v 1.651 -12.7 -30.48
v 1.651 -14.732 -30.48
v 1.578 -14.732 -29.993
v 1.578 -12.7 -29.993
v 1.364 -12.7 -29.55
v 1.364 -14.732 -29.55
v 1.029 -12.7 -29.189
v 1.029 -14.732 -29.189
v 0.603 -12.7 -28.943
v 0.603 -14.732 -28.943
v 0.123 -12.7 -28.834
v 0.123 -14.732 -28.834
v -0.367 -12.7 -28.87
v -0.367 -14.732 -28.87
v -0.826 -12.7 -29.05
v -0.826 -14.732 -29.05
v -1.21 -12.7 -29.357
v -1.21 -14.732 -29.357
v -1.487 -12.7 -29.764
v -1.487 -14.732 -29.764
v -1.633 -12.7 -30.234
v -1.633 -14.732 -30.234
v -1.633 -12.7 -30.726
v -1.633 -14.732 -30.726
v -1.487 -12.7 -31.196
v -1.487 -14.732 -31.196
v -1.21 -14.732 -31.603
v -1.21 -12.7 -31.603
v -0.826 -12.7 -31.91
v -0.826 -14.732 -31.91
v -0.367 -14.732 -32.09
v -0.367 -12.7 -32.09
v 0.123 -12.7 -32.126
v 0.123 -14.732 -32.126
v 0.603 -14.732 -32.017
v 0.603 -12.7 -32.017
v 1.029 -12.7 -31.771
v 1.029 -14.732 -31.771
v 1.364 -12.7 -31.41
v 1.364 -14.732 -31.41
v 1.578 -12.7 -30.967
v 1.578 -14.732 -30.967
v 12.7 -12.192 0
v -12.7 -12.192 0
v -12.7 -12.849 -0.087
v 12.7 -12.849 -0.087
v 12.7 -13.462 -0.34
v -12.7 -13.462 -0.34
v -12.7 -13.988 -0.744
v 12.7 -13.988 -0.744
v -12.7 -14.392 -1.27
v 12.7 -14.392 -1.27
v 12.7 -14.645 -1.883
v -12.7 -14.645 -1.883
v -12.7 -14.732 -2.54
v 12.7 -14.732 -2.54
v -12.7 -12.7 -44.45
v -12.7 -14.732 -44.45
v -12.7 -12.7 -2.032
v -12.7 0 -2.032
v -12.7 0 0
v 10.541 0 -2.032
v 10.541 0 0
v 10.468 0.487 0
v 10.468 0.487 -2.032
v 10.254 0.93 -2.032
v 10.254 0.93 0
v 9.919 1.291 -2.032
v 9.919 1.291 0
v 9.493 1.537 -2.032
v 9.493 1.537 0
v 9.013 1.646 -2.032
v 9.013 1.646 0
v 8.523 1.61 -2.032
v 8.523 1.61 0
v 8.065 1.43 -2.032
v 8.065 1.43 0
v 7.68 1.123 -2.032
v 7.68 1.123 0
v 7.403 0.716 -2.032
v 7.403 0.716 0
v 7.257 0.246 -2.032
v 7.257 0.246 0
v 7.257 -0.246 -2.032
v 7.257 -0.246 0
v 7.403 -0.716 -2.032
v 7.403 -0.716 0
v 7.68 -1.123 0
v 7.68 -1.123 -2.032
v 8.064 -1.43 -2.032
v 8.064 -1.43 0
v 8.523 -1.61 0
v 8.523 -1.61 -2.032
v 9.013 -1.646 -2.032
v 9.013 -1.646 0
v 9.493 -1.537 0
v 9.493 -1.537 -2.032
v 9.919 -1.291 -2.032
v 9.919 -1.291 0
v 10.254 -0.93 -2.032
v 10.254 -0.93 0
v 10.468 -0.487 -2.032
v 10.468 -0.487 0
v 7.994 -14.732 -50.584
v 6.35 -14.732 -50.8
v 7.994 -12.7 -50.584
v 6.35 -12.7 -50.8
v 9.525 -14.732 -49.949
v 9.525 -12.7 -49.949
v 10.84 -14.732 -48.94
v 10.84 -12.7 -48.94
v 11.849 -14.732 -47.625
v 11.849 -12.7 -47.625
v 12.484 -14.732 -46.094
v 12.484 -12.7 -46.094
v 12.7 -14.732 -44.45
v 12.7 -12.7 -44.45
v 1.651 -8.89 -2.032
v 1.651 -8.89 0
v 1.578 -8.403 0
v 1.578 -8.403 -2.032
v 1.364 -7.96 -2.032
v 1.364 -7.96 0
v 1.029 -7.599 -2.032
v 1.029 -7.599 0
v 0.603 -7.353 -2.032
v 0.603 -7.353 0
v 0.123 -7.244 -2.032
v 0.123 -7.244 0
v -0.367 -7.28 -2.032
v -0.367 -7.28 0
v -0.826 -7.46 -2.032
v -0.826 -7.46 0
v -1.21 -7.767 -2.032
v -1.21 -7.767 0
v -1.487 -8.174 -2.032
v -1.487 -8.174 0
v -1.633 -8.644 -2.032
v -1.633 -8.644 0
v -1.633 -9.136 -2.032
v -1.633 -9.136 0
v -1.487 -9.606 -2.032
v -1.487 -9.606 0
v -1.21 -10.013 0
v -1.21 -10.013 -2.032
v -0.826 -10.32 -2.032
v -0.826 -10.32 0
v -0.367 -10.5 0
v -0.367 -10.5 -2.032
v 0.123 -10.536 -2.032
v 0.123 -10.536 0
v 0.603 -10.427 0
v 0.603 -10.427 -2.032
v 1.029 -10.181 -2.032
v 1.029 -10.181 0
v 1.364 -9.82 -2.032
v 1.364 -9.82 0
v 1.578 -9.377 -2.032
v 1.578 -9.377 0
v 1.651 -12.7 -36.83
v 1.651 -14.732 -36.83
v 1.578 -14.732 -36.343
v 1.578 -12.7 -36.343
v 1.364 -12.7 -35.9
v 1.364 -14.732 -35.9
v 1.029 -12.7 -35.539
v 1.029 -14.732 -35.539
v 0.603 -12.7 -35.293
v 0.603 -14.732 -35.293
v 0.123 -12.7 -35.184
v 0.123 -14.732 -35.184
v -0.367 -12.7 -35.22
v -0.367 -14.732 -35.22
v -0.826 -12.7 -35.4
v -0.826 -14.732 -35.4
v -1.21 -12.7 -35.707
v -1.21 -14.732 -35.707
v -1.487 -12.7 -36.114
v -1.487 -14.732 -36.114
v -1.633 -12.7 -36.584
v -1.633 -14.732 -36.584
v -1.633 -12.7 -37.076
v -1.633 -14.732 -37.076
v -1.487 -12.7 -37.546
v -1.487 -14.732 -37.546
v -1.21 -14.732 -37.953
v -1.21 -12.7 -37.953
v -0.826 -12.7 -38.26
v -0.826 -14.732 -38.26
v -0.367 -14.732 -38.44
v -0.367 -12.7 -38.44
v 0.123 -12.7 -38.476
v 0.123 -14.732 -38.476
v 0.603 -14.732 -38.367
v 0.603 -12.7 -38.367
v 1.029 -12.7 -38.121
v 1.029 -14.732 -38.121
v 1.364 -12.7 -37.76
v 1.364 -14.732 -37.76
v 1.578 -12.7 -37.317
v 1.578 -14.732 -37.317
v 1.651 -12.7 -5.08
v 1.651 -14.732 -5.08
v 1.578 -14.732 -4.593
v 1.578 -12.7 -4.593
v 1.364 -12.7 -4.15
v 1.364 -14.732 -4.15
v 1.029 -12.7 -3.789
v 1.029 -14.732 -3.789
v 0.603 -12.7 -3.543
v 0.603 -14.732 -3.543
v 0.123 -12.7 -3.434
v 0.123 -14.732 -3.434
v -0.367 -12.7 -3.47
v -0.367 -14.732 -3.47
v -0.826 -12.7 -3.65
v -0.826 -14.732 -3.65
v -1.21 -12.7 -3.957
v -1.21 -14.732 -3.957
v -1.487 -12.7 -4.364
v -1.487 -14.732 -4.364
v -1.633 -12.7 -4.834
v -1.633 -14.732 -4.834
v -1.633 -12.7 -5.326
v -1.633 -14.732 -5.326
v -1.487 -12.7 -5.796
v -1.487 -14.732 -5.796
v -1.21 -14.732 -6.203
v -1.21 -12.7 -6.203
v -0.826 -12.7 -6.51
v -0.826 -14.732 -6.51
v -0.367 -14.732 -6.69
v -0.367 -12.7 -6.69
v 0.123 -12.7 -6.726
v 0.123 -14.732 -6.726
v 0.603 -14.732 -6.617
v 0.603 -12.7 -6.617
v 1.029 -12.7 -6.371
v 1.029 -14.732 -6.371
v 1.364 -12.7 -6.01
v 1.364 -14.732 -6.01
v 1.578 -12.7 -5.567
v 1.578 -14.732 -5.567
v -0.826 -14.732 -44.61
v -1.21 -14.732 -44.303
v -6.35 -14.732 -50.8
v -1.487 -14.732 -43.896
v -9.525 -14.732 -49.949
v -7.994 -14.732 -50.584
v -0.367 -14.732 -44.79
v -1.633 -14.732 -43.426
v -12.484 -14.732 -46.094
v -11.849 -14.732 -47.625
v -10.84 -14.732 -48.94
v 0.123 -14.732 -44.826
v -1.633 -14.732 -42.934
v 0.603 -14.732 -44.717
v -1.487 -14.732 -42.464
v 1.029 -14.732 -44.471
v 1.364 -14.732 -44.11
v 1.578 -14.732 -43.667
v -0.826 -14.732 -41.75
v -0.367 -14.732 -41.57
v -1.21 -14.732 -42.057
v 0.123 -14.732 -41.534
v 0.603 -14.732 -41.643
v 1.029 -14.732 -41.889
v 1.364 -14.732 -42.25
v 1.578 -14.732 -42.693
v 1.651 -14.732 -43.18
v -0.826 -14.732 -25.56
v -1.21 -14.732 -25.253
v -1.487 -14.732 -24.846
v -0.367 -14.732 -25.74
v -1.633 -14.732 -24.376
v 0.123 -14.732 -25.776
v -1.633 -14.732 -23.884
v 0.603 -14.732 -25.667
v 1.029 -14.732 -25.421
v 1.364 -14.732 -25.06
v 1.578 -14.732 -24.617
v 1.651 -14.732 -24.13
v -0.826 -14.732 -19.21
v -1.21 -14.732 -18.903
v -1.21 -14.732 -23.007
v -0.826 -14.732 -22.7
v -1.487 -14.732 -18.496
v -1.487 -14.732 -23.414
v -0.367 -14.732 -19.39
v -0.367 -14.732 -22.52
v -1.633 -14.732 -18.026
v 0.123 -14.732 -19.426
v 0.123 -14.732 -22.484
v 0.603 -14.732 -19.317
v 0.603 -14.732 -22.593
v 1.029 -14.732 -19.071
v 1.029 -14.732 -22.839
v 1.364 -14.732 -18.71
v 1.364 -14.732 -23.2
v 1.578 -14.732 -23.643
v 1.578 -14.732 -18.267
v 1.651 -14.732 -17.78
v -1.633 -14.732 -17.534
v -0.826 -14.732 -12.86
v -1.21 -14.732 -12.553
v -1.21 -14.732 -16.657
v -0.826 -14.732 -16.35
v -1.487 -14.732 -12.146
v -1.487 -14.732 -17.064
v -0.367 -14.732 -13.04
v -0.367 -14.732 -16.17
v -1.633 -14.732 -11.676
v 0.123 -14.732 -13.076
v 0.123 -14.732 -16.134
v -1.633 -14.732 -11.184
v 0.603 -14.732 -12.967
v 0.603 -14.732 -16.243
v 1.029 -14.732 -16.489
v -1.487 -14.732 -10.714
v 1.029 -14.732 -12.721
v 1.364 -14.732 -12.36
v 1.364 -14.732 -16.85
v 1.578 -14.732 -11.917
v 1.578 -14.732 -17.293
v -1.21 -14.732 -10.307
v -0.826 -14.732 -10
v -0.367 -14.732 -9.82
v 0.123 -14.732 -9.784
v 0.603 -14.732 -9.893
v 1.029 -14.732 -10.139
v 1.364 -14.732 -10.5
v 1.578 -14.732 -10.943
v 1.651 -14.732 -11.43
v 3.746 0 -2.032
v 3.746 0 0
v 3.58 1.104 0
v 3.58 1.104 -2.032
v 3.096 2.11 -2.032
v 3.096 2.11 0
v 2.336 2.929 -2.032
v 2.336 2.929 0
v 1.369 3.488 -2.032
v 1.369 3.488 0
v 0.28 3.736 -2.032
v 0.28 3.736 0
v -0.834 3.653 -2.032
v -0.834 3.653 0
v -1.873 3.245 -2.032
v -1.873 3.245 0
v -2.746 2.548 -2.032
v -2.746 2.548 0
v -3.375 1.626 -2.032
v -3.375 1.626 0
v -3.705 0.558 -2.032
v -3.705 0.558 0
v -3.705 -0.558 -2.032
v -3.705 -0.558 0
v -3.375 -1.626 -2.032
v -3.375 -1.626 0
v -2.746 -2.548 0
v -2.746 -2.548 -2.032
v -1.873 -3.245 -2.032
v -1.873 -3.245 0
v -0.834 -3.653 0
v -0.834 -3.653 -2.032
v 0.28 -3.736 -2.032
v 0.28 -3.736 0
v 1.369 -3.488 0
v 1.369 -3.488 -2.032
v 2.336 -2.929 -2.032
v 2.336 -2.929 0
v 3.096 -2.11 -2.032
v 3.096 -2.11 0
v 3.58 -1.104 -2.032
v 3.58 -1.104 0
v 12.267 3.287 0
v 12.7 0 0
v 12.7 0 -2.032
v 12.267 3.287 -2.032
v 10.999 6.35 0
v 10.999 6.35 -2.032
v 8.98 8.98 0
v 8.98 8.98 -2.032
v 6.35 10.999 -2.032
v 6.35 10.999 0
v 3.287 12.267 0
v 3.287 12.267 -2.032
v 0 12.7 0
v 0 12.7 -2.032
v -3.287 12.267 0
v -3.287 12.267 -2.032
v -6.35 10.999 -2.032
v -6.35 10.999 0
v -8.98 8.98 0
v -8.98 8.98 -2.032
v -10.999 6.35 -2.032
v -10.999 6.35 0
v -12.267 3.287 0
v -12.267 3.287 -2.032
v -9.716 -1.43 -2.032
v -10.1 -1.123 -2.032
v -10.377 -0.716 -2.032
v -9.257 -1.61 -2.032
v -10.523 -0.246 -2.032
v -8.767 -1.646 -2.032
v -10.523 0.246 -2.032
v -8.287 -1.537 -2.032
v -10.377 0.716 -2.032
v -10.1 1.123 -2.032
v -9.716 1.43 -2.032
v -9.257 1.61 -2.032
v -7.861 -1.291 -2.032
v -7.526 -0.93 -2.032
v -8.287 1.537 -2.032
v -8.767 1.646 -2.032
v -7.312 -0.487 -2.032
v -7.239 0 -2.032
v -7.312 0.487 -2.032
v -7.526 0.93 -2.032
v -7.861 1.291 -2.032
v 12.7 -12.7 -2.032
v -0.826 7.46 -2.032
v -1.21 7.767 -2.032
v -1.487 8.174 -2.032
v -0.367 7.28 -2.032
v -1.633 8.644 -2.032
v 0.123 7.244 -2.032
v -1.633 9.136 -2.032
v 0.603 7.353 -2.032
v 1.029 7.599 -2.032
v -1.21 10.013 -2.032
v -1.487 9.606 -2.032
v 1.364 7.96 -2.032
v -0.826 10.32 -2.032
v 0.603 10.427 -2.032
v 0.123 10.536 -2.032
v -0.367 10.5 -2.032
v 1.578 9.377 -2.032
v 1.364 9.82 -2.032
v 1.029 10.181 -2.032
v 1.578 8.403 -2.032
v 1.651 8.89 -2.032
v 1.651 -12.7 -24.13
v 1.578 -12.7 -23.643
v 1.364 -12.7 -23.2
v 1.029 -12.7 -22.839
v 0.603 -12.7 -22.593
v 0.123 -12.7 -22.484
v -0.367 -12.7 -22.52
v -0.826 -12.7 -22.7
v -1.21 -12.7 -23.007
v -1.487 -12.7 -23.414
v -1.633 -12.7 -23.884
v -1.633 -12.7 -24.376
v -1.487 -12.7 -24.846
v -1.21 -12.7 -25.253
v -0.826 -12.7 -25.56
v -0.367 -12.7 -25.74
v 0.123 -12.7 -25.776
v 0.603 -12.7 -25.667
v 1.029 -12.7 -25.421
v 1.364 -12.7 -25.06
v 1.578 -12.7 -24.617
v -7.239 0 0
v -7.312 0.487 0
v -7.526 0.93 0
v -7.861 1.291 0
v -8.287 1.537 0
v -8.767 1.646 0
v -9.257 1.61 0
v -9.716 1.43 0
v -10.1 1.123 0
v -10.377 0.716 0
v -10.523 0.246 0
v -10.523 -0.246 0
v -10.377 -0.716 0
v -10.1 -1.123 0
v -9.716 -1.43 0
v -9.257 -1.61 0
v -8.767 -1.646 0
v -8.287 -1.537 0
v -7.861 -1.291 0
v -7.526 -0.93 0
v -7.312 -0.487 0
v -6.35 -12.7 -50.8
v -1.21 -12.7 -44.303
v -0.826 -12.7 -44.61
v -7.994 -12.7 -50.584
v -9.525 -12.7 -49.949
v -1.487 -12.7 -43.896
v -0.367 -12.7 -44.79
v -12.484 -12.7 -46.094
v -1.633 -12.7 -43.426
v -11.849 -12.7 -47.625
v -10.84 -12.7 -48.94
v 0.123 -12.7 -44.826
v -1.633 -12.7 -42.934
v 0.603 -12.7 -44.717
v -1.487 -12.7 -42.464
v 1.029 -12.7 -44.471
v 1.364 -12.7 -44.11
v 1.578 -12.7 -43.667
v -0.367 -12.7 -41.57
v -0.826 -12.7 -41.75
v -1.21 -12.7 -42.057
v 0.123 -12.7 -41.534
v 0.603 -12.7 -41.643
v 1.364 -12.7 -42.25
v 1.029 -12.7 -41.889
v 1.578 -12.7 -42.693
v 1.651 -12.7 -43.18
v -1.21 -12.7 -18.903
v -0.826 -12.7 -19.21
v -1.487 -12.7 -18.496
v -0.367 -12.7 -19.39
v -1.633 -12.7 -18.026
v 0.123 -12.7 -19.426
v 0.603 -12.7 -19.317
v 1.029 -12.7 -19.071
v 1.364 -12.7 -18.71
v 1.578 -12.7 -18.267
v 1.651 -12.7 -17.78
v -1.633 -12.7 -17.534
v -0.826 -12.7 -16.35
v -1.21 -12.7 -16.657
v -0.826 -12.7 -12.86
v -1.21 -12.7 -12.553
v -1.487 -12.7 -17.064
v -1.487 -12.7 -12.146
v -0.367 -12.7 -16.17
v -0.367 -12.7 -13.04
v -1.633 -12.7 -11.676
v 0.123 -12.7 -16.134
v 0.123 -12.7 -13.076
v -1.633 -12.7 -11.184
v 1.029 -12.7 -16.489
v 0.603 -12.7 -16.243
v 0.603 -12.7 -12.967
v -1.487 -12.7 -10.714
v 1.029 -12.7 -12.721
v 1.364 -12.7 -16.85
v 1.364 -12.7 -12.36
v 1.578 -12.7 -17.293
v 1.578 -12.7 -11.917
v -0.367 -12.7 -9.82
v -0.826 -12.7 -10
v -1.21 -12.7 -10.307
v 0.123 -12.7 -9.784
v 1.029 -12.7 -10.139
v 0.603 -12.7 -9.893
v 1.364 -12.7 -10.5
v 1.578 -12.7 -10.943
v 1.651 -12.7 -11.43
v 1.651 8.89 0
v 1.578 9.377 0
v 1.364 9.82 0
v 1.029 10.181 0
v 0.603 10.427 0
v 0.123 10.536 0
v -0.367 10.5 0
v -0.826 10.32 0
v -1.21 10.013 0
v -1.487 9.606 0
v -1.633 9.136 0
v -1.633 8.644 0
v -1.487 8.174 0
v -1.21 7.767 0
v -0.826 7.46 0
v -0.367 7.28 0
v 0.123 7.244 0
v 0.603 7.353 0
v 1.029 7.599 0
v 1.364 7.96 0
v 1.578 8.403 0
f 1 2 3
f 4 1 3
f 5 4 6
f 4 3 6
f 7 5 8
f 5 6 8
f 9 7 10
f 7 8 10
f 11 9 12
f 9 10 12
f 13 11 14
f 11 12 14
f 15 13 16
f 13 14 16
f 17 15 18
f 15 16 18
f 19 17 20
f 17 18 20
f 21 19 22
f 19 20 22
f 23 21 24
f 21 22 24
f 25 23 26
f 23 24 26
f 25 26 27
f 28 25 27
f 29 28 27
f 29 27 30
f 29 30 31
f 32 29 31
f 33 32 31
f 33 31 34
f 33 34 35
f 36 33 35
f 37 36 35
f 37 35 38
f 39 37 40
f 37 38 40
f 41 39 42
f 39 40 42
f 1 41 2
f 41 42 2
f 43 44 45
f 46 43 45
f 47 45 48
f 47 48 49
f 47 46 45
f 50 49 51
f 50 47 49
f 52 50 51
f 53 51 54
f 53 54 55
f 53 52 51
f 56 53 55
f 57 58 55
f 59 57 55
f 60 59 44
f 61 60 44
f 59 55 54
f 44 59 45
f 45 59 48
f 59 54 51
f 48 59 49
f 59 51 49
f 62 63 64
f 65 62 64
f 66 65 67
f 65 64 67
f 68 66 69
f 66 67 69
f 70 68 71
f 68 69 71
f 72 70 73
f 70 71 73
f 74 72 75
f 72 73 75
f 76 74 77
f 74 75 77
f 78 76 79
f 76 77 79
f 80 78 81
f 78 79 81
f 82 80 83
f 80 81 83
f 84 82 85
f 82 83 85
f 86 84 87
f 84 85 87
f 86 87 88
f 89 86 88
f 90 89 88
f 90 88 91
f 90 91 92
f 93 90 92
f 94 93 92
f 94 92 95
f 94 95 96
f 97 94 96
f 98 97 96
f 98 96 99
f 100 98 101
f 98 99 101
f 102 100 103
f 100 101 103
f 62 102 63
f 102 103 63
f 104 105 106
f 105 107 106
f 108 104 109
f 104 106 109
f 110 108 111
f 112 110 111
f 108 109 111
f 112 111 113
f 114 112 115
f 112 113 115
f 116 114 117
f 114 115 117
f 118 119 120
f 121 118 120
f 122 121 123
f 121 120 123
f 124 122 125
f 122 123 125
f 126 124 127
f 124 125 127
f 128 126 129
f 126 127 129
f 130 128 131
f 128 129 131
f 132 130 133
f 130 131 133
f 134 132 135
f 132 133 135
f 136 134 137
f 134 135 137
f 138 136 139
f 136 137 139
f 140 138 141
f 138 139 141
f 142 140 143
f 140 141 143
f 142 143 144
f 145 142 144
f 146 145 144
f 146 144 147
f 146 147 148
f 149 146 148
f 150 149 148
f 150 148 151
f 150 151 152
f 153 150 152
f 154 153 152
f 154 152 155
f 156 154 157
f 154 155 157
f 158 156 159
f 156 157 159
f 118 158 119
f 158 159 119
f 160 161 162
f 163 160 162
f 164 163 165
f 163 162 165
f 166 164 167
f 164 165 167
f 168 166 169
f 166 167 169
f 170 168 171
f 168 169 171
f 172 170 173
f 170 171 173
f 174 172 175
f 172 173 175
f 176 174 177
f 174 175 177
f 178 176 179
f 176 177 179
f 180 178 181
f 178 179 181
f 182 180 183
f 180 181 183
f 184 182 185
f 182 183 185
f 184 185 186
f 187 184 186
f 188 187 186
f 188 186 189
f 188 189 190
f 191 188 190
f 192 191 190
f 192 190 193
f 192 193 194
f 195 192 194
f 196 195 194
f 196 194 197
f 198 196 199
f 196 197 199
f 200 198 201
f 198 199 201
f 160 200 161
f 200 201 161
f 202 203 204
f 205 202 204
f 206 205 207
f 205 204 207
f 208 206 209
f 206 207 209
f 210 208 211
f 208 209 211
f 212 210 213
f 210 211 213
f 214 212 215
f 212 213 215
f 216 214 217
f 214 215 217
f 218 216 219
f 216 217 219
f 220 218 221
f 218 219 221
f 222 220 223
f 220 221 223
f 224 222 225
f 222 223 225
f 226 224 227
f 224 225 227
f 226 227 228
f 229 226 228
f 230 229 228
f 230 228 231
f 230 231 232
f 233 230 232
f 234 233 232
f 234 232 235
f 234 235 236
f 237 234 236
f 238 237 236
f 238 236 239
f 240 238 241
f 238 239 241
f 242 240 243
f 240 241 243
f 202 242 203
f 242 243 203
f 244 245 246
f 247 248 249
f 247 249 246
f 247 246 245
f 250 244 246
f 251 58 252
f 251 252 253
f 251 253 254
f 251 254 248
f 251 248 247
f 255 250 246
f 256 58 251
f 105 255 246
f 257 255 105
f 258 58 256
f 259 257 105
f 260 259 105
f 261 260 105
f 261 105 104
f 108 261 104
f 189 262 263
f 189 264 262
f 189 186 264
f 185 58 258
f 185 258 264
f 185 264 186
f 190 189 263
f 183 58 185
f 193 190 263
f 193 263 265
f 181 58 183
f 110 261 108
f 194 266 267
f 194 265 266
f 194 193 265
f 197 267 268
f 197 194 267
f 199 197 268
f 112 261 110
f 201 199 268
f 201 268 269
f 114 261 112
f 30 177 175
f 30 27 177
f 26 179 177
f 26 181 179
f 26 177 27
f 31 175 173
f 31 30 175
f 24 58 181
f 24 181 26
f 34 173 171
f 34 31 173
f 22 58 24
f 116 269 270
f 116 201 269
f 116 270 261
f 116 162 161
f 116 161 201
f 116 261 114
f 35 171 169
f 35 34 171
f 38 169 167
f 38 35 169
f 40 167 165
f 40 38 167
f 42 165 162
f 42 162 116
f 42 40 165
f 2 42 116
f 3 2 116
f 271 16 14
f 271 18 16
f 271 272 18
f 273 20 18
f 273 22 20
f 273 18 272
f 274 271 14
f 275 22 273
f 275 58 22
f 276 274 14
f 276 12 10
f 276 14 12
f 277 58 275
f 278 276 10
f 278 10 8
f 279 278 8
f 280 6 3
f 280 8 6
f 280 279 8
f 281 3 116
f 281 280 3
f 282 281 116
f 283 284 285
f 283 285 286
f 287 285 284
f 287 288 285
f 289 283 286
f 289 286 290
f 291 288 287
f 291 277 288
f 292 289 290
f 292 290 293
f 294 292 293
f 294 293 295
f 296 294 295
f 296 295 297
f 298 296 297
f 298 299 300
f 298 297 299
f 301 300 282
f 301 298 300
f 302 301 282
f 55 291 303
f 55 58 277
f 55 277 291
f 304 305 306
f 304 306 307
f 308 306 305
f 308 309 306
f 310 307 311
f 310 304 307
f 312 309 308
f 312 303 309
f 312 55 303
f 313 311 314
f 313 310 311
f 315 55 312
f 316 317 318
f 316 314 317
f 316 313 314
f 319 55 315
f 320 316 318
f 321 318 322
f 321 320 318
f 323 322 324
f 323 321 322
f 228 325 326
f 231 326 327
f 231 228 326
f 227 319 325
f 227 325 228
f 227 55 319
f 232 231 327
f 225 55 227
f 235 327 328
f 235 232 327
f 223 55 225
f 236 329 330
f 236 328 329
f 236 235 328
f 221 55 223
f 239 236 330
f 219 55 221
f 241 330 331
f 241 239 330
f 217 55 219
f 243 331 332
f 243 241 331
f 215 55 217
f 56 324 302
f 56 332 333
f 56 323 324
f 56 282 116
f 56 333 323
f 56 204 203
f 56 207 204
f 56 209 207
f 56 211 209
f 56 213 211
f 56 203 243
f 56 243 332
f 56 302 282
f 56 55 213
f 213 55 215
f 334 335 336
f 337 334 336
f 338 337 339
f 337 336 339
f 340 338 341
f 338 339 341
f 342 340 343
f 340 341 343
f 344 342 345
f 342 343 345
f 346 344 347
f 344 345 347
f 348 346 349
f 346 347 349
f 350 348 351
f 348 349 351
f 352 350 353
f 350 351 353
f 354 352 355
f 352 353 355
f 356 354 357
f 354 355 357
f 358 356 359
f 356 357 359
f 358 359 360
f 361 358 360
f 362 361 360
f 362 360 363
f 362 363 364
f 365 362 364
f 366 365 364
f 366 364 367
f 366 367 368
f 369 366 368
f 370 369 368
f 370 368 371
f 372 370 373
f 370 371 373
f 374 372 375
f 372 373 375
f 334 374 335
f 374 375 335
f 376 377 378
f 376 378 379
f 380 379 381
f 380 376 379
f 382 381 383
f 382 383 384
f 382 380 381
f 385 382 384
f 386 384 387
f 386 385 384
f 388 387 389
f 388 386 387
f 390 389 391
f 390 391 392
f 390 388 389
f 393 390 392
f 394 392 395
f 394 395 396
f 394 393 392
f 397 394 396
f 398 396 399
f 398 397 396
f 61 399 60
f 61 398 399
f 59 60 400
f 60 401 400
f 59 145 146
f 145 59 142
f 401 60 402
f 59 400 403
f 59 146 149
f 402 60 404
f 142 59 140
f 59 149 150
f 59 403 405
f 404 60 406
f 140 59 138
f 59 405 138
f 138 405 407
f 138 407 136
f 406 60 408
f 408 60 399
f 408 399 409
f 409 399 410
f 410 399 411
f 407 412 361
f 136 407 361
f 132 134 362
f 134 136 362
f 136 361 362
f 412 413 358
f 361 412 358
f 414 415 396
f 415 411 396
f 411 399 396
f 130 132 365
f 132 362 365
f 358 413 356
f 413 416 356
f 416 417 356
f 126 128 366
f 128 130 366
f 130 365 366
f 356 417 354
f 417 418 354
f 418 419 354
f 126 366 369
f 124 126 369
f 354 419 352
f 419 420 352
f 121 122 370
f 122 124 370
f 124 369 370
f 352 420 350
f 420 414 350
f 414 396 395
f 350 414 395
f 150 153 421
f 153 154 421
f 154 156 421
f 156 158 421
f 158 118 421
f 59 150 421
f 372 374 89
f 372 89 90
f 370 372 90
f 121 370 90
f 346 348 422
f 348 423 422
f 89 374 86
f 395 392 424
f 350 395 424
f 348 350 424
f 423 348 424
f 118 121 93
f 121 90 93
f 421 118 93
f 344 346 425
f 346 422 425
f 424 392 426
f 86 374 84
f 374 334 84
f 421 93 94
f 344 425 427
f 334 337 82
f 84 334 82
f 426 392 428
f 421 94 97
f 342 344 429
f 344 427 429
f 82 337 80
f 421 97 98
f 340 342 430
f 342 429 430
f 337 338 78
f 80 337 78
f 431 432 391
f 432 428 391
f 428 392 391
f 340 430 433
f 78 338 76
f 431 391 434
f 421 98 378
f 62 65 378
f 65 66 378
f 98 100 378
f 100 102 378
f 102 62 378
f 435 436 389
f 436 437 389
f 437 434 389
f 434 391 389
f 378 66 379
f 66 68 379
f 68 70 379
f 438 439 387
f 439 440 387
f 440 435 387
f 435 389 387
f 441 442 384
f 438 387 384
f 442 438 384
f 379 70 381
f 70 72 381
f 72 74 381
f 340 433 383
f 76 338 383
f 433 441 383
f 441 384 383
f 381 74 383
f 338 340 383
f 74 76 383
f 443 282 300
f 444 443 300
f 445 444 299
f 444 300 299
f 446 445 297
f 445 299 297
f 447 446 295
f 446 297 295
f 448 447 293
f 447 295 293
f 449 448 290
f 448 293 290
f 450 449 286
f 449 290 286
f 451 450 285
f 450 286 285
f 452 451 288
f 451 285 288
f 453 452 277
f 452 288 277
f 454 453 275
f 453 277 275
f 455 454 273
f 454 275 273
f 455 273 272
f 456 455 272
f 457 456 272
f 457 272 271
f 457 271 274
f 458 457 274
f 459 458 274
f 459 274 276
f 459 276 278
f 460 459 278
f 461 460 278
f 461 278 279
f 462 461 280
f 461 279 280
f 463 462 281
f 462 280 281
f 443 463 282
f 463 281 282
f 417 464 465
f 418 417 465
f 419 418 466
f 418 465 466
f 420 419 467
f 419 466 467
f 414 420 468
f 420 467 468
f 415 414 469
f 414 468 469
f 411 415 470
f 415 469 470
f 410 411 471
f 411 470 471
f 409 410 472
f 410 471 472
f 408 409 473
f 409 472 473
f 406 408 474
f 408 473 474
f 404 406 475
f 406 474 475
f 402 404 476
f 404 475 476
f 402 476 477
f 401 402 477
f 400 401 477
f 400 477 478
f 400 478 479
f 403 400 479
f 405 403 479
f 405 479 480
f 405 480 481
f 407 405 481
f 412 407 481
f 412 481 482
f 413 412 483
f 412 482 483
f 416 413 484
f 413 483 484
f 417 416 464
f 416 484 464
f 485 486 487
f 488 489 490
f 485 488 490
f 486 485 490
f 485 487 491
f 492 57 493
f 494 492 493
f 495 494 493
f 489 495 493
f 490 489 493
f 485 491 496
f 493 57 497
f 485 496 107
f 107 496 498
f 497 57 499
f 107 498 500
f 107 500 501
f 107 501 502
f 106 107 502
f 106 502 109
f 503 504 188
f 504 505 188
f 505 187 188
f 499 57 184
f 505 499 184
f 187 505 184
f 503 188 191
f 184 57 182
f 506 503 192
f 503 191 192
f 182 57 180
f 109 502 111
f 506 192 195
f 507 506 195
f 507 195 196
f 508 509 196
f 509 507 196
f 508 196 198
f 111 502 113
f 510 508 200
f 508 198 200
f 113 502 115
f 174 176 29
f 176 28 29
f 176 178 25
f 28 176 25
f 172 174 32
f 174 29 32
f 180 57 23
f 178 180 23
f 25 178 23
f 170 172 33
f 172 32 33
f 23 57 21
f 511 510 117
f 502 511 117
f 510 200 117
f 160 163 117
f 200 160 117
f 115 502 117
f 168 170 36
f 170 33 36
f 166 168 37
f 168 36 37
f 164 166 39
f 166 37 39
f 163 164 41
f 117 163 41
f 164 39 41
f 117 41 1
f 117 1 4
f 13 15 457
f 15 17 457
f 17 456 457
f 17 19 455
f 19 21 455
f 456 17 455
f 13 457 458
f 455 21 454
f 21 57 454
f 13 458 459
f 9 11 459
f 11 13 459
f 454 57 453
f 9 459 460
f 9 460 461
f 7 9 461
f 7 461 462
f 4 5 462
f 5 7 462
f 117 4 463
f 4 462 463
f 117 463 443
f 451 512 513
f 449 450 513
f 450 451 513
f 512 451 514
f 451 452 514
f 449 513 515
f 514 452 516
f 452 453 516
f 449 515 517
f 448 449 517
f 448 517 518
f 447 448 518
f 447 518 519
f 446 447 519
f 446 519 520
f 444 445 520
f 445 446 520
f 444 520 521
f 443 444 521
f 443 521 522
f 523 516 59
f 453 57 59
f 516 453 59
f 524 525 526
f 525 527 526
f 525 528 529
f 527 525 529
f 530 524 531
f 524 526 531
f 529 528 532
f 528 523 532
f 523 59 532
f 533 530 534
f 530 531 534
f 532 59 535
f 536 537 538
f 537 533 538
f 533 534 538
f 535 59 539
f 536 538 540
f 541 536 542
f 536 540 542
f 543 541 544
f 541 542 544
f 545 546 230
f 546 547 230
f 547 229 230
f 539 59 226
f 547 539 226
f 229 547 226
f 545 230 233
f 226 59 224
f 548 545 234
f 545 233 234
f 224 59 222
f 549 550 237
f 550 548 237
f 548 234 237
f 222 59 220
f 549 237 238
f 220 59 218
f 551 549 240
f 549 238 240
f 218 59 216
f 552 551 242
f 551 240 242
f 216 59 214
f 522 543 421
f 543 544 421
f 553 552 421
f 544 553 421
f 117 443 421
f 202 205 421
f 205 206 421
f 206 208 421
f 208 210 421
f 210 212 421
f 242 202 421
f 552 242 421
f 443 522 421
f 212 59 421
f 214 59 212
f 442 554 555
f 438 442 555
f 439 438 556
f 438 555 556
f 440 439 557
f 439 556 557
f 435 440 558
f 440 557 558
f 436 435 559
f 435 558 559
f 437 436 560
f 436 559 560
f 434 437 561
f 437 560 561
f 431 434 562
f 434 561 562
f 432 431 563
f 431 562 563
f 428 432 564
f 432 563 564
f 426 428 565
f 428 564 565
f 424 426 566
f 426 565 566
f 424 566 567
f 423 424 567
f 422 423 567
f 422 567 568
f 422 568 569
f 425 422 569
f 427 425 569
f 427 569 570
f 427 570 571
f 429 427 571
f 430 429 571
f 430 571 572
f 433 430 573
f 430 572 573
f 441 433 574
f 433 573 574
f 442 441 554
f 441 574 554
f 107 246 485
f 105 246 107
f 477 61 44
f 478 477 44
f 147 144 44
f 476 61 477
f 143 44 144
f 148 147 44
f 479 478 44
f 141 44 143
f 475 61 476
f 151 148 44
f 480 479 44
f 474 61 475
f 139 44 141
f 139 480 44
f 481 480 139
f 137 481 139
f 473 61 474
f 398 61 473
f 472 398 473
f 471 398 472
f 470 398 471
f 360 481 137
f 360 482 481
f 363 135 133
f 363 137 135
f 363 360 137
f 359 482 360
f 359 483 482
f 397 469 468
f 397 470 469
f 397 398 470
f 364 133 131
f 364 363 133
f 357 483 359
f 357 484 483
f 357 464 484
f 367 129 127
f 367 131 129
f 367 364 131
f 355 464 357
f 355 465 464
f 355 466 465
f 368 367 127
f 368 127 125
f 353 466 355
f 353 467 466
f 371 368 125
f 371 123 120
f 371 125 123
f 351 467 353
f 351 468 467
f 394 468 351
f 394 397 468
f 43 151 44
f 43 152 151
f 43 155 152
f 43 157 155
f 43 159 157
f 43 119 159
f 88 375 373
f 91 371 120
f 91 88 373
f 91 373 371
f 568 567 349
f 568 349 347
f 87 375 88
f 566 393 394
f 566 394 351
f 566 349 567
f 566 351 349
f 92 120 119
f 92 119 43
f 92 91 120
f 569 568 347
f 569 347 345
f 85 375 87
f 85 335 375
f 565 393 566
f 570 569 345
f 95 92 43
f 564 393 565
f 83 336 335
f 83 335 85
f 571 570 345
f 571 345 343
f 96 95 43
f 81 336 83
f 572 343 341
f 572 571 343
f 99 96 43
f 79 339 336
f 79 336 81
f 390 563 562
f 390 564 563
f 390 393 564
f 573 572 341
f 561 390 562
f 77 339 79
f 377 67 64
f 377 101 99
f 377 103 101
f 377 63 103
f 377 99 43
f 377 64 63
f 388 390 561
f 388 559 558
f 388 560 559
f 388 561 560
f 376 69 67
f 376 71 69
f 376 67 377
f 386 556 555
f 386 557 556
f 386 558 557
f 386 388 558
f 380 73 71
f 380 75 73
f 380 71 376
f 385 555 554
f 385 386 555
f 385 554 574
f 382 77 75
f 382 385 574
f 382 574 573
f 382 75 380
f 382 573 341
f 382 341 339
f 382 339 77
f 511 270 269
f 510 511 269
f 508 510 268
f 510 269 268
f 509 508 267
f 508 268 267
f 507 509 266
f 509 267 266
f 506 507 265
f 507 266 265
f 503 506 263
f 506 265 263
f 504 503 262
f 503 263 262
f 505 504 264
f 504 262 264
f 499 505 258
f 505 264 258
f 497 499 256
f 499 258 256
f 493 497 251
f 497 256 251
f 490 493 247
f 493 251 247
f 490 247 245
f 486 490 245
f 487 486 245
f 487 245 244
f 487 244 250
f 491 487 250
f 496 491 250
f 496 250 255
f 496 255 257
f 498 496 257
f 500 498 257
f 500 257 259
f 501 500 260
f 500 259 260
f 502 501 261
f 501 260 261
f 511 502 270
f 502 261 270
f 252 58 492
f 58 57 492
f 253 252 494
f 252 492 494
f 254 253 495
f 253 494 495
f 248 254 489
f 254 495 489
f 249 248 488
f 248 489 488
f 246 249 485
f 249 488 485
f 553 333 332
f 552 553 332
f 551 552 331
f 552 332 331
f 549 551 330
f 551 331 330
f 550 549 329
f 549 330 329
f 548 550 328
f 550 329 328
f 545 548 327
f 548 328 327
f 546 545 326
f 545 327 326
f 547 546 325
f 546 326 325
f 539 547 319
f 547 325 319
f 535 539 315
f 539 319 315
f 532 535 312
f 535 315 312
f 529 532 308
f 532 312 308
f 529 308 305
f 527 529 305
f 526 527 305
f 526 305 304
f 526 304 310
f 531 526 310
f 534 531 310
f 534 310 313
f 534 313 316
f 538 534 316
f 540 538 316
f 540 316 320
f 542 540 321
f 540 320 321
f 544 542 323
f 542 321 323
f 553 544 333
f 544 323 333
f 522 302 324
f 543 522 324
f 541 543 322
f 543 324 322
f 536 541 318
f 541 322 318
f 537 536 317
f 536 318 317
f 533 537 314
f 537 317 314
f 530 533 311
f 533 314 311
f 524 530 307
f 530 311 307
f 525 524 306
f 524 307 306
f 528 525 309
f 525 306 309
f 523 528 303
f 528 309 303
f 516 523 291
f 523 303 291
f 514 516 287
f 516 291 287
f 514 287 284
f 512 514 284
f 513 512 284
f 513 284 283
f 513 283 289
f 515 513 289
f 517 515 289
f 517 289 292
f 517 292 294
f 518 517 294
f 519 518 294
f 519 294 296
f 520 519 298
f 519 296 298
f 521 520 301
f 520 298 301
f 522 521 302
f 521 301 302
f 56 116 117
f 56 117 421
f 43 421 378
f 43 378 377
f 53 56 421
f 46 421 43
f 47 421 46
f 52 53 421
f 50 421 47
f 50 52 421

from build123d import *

# Parameters (mm, degrees)
SKETCH1_R           = 3.7465
SKETCH1_R_2         = 1.651
BOSS_EXTRUDE1_DEPTH = 2.032
SKETCH2_W           = 25.4
SKETCH2_H           = 50.8
SKETCH2_R           = 1.651
BOSS_EXTRUDE3_DEPTH = 2.032
FILLET3_R           = 2.54
FILLET4_R           = 6.35


with BuildPart() as part:
    # Sketch1 → Boss-Extrude1 (new body)
    with BuildSketch(Plane.XY):
        with BuildLine():
            Line((-12.7, 0), (-12.7, -14.732))
            Line((-12.7, -14.732), (12.7, -14.732))
            Line((12.7, -14.732), (12.7, 0))
            ThreePointArc((12.7, 0), (0, 12.7), (-12.7, 0))
        make_face()
        Circle(SKETCH1_R, mode=Mode.SUBTRACT)
        with Locations((0, 8.89)):
            Circle(SKETCH1_R_2, mode=Mode.SUBTRACT)
        with Locations((8.89, 0)):
            Circle(SKETCH1_R_2, mode=Mode.SUBTRACT)
        with Locations((0, -8.89)):
            Circle(SKETCH1_R_2, mode=Mode.SUBTRACT)
        with Locations((-8.89, 0)):
            Circle(SKETCH1_R_2, mode=Mode.SUBTRACT)
    extrude(amount=-BOSS_EXTRUDE1_DEPTH)

    # Sketch2 → Boss-Extrude3 (add)
    with BuildSketch(Plane.XZ.offset(14.732)):
        with Locations((0, -25.4)):
            Rectangle(SKETCH2_W, SKETCH2_H)
        with Locations((0, -43.18)):
            Circle(SKETCH2_R, mode=Mode.SUBTRACT)
        with Locations((0, -36.83)):
            Circle(SKETCH2_R, mode=Mode.SUBTRACT)
        with Locations((0, -30.48)):
            Circle(SKETCH2_R, mode=Mode.SUBTRACT)
        with Locations((0, -24.13)):
            Circle(SKETCH2_R, mode=Mode.SUBTRACT)
        with Locations((0, -17.78)):
            Circle(SKETCH2_R, mode=Mode.SUBTRACT)
        with Locations((0, -11.43)):
            Circle(SKETCH2_R, mode=Mode.SUBTRACT)
        with Locations((0, -5.08)):
            Circle(SKETCH2_R, mode=Mode.SUBTRACT)
    extrude(amount=-BOSS_EXTRUDE3_DEPTH)

    # Fillet3
    fillet3_edges = [part.edges().sort_by_distance(p)[0] for p in [
        (0, -14.732, 0),
    ]]
    fillet(fillet3_edges, radius=FILLET3_R)

    # Fillet4
    fillet4_edges = [part.edges().sort_by_distance(p)[0] for p in [
        (-12.7, -13.716, -50.8),
        (12.7, -13.716, -50.8),
    ]]
    fillet(fillet4_edges, radius=FILLET4_R)


solid = part.part
